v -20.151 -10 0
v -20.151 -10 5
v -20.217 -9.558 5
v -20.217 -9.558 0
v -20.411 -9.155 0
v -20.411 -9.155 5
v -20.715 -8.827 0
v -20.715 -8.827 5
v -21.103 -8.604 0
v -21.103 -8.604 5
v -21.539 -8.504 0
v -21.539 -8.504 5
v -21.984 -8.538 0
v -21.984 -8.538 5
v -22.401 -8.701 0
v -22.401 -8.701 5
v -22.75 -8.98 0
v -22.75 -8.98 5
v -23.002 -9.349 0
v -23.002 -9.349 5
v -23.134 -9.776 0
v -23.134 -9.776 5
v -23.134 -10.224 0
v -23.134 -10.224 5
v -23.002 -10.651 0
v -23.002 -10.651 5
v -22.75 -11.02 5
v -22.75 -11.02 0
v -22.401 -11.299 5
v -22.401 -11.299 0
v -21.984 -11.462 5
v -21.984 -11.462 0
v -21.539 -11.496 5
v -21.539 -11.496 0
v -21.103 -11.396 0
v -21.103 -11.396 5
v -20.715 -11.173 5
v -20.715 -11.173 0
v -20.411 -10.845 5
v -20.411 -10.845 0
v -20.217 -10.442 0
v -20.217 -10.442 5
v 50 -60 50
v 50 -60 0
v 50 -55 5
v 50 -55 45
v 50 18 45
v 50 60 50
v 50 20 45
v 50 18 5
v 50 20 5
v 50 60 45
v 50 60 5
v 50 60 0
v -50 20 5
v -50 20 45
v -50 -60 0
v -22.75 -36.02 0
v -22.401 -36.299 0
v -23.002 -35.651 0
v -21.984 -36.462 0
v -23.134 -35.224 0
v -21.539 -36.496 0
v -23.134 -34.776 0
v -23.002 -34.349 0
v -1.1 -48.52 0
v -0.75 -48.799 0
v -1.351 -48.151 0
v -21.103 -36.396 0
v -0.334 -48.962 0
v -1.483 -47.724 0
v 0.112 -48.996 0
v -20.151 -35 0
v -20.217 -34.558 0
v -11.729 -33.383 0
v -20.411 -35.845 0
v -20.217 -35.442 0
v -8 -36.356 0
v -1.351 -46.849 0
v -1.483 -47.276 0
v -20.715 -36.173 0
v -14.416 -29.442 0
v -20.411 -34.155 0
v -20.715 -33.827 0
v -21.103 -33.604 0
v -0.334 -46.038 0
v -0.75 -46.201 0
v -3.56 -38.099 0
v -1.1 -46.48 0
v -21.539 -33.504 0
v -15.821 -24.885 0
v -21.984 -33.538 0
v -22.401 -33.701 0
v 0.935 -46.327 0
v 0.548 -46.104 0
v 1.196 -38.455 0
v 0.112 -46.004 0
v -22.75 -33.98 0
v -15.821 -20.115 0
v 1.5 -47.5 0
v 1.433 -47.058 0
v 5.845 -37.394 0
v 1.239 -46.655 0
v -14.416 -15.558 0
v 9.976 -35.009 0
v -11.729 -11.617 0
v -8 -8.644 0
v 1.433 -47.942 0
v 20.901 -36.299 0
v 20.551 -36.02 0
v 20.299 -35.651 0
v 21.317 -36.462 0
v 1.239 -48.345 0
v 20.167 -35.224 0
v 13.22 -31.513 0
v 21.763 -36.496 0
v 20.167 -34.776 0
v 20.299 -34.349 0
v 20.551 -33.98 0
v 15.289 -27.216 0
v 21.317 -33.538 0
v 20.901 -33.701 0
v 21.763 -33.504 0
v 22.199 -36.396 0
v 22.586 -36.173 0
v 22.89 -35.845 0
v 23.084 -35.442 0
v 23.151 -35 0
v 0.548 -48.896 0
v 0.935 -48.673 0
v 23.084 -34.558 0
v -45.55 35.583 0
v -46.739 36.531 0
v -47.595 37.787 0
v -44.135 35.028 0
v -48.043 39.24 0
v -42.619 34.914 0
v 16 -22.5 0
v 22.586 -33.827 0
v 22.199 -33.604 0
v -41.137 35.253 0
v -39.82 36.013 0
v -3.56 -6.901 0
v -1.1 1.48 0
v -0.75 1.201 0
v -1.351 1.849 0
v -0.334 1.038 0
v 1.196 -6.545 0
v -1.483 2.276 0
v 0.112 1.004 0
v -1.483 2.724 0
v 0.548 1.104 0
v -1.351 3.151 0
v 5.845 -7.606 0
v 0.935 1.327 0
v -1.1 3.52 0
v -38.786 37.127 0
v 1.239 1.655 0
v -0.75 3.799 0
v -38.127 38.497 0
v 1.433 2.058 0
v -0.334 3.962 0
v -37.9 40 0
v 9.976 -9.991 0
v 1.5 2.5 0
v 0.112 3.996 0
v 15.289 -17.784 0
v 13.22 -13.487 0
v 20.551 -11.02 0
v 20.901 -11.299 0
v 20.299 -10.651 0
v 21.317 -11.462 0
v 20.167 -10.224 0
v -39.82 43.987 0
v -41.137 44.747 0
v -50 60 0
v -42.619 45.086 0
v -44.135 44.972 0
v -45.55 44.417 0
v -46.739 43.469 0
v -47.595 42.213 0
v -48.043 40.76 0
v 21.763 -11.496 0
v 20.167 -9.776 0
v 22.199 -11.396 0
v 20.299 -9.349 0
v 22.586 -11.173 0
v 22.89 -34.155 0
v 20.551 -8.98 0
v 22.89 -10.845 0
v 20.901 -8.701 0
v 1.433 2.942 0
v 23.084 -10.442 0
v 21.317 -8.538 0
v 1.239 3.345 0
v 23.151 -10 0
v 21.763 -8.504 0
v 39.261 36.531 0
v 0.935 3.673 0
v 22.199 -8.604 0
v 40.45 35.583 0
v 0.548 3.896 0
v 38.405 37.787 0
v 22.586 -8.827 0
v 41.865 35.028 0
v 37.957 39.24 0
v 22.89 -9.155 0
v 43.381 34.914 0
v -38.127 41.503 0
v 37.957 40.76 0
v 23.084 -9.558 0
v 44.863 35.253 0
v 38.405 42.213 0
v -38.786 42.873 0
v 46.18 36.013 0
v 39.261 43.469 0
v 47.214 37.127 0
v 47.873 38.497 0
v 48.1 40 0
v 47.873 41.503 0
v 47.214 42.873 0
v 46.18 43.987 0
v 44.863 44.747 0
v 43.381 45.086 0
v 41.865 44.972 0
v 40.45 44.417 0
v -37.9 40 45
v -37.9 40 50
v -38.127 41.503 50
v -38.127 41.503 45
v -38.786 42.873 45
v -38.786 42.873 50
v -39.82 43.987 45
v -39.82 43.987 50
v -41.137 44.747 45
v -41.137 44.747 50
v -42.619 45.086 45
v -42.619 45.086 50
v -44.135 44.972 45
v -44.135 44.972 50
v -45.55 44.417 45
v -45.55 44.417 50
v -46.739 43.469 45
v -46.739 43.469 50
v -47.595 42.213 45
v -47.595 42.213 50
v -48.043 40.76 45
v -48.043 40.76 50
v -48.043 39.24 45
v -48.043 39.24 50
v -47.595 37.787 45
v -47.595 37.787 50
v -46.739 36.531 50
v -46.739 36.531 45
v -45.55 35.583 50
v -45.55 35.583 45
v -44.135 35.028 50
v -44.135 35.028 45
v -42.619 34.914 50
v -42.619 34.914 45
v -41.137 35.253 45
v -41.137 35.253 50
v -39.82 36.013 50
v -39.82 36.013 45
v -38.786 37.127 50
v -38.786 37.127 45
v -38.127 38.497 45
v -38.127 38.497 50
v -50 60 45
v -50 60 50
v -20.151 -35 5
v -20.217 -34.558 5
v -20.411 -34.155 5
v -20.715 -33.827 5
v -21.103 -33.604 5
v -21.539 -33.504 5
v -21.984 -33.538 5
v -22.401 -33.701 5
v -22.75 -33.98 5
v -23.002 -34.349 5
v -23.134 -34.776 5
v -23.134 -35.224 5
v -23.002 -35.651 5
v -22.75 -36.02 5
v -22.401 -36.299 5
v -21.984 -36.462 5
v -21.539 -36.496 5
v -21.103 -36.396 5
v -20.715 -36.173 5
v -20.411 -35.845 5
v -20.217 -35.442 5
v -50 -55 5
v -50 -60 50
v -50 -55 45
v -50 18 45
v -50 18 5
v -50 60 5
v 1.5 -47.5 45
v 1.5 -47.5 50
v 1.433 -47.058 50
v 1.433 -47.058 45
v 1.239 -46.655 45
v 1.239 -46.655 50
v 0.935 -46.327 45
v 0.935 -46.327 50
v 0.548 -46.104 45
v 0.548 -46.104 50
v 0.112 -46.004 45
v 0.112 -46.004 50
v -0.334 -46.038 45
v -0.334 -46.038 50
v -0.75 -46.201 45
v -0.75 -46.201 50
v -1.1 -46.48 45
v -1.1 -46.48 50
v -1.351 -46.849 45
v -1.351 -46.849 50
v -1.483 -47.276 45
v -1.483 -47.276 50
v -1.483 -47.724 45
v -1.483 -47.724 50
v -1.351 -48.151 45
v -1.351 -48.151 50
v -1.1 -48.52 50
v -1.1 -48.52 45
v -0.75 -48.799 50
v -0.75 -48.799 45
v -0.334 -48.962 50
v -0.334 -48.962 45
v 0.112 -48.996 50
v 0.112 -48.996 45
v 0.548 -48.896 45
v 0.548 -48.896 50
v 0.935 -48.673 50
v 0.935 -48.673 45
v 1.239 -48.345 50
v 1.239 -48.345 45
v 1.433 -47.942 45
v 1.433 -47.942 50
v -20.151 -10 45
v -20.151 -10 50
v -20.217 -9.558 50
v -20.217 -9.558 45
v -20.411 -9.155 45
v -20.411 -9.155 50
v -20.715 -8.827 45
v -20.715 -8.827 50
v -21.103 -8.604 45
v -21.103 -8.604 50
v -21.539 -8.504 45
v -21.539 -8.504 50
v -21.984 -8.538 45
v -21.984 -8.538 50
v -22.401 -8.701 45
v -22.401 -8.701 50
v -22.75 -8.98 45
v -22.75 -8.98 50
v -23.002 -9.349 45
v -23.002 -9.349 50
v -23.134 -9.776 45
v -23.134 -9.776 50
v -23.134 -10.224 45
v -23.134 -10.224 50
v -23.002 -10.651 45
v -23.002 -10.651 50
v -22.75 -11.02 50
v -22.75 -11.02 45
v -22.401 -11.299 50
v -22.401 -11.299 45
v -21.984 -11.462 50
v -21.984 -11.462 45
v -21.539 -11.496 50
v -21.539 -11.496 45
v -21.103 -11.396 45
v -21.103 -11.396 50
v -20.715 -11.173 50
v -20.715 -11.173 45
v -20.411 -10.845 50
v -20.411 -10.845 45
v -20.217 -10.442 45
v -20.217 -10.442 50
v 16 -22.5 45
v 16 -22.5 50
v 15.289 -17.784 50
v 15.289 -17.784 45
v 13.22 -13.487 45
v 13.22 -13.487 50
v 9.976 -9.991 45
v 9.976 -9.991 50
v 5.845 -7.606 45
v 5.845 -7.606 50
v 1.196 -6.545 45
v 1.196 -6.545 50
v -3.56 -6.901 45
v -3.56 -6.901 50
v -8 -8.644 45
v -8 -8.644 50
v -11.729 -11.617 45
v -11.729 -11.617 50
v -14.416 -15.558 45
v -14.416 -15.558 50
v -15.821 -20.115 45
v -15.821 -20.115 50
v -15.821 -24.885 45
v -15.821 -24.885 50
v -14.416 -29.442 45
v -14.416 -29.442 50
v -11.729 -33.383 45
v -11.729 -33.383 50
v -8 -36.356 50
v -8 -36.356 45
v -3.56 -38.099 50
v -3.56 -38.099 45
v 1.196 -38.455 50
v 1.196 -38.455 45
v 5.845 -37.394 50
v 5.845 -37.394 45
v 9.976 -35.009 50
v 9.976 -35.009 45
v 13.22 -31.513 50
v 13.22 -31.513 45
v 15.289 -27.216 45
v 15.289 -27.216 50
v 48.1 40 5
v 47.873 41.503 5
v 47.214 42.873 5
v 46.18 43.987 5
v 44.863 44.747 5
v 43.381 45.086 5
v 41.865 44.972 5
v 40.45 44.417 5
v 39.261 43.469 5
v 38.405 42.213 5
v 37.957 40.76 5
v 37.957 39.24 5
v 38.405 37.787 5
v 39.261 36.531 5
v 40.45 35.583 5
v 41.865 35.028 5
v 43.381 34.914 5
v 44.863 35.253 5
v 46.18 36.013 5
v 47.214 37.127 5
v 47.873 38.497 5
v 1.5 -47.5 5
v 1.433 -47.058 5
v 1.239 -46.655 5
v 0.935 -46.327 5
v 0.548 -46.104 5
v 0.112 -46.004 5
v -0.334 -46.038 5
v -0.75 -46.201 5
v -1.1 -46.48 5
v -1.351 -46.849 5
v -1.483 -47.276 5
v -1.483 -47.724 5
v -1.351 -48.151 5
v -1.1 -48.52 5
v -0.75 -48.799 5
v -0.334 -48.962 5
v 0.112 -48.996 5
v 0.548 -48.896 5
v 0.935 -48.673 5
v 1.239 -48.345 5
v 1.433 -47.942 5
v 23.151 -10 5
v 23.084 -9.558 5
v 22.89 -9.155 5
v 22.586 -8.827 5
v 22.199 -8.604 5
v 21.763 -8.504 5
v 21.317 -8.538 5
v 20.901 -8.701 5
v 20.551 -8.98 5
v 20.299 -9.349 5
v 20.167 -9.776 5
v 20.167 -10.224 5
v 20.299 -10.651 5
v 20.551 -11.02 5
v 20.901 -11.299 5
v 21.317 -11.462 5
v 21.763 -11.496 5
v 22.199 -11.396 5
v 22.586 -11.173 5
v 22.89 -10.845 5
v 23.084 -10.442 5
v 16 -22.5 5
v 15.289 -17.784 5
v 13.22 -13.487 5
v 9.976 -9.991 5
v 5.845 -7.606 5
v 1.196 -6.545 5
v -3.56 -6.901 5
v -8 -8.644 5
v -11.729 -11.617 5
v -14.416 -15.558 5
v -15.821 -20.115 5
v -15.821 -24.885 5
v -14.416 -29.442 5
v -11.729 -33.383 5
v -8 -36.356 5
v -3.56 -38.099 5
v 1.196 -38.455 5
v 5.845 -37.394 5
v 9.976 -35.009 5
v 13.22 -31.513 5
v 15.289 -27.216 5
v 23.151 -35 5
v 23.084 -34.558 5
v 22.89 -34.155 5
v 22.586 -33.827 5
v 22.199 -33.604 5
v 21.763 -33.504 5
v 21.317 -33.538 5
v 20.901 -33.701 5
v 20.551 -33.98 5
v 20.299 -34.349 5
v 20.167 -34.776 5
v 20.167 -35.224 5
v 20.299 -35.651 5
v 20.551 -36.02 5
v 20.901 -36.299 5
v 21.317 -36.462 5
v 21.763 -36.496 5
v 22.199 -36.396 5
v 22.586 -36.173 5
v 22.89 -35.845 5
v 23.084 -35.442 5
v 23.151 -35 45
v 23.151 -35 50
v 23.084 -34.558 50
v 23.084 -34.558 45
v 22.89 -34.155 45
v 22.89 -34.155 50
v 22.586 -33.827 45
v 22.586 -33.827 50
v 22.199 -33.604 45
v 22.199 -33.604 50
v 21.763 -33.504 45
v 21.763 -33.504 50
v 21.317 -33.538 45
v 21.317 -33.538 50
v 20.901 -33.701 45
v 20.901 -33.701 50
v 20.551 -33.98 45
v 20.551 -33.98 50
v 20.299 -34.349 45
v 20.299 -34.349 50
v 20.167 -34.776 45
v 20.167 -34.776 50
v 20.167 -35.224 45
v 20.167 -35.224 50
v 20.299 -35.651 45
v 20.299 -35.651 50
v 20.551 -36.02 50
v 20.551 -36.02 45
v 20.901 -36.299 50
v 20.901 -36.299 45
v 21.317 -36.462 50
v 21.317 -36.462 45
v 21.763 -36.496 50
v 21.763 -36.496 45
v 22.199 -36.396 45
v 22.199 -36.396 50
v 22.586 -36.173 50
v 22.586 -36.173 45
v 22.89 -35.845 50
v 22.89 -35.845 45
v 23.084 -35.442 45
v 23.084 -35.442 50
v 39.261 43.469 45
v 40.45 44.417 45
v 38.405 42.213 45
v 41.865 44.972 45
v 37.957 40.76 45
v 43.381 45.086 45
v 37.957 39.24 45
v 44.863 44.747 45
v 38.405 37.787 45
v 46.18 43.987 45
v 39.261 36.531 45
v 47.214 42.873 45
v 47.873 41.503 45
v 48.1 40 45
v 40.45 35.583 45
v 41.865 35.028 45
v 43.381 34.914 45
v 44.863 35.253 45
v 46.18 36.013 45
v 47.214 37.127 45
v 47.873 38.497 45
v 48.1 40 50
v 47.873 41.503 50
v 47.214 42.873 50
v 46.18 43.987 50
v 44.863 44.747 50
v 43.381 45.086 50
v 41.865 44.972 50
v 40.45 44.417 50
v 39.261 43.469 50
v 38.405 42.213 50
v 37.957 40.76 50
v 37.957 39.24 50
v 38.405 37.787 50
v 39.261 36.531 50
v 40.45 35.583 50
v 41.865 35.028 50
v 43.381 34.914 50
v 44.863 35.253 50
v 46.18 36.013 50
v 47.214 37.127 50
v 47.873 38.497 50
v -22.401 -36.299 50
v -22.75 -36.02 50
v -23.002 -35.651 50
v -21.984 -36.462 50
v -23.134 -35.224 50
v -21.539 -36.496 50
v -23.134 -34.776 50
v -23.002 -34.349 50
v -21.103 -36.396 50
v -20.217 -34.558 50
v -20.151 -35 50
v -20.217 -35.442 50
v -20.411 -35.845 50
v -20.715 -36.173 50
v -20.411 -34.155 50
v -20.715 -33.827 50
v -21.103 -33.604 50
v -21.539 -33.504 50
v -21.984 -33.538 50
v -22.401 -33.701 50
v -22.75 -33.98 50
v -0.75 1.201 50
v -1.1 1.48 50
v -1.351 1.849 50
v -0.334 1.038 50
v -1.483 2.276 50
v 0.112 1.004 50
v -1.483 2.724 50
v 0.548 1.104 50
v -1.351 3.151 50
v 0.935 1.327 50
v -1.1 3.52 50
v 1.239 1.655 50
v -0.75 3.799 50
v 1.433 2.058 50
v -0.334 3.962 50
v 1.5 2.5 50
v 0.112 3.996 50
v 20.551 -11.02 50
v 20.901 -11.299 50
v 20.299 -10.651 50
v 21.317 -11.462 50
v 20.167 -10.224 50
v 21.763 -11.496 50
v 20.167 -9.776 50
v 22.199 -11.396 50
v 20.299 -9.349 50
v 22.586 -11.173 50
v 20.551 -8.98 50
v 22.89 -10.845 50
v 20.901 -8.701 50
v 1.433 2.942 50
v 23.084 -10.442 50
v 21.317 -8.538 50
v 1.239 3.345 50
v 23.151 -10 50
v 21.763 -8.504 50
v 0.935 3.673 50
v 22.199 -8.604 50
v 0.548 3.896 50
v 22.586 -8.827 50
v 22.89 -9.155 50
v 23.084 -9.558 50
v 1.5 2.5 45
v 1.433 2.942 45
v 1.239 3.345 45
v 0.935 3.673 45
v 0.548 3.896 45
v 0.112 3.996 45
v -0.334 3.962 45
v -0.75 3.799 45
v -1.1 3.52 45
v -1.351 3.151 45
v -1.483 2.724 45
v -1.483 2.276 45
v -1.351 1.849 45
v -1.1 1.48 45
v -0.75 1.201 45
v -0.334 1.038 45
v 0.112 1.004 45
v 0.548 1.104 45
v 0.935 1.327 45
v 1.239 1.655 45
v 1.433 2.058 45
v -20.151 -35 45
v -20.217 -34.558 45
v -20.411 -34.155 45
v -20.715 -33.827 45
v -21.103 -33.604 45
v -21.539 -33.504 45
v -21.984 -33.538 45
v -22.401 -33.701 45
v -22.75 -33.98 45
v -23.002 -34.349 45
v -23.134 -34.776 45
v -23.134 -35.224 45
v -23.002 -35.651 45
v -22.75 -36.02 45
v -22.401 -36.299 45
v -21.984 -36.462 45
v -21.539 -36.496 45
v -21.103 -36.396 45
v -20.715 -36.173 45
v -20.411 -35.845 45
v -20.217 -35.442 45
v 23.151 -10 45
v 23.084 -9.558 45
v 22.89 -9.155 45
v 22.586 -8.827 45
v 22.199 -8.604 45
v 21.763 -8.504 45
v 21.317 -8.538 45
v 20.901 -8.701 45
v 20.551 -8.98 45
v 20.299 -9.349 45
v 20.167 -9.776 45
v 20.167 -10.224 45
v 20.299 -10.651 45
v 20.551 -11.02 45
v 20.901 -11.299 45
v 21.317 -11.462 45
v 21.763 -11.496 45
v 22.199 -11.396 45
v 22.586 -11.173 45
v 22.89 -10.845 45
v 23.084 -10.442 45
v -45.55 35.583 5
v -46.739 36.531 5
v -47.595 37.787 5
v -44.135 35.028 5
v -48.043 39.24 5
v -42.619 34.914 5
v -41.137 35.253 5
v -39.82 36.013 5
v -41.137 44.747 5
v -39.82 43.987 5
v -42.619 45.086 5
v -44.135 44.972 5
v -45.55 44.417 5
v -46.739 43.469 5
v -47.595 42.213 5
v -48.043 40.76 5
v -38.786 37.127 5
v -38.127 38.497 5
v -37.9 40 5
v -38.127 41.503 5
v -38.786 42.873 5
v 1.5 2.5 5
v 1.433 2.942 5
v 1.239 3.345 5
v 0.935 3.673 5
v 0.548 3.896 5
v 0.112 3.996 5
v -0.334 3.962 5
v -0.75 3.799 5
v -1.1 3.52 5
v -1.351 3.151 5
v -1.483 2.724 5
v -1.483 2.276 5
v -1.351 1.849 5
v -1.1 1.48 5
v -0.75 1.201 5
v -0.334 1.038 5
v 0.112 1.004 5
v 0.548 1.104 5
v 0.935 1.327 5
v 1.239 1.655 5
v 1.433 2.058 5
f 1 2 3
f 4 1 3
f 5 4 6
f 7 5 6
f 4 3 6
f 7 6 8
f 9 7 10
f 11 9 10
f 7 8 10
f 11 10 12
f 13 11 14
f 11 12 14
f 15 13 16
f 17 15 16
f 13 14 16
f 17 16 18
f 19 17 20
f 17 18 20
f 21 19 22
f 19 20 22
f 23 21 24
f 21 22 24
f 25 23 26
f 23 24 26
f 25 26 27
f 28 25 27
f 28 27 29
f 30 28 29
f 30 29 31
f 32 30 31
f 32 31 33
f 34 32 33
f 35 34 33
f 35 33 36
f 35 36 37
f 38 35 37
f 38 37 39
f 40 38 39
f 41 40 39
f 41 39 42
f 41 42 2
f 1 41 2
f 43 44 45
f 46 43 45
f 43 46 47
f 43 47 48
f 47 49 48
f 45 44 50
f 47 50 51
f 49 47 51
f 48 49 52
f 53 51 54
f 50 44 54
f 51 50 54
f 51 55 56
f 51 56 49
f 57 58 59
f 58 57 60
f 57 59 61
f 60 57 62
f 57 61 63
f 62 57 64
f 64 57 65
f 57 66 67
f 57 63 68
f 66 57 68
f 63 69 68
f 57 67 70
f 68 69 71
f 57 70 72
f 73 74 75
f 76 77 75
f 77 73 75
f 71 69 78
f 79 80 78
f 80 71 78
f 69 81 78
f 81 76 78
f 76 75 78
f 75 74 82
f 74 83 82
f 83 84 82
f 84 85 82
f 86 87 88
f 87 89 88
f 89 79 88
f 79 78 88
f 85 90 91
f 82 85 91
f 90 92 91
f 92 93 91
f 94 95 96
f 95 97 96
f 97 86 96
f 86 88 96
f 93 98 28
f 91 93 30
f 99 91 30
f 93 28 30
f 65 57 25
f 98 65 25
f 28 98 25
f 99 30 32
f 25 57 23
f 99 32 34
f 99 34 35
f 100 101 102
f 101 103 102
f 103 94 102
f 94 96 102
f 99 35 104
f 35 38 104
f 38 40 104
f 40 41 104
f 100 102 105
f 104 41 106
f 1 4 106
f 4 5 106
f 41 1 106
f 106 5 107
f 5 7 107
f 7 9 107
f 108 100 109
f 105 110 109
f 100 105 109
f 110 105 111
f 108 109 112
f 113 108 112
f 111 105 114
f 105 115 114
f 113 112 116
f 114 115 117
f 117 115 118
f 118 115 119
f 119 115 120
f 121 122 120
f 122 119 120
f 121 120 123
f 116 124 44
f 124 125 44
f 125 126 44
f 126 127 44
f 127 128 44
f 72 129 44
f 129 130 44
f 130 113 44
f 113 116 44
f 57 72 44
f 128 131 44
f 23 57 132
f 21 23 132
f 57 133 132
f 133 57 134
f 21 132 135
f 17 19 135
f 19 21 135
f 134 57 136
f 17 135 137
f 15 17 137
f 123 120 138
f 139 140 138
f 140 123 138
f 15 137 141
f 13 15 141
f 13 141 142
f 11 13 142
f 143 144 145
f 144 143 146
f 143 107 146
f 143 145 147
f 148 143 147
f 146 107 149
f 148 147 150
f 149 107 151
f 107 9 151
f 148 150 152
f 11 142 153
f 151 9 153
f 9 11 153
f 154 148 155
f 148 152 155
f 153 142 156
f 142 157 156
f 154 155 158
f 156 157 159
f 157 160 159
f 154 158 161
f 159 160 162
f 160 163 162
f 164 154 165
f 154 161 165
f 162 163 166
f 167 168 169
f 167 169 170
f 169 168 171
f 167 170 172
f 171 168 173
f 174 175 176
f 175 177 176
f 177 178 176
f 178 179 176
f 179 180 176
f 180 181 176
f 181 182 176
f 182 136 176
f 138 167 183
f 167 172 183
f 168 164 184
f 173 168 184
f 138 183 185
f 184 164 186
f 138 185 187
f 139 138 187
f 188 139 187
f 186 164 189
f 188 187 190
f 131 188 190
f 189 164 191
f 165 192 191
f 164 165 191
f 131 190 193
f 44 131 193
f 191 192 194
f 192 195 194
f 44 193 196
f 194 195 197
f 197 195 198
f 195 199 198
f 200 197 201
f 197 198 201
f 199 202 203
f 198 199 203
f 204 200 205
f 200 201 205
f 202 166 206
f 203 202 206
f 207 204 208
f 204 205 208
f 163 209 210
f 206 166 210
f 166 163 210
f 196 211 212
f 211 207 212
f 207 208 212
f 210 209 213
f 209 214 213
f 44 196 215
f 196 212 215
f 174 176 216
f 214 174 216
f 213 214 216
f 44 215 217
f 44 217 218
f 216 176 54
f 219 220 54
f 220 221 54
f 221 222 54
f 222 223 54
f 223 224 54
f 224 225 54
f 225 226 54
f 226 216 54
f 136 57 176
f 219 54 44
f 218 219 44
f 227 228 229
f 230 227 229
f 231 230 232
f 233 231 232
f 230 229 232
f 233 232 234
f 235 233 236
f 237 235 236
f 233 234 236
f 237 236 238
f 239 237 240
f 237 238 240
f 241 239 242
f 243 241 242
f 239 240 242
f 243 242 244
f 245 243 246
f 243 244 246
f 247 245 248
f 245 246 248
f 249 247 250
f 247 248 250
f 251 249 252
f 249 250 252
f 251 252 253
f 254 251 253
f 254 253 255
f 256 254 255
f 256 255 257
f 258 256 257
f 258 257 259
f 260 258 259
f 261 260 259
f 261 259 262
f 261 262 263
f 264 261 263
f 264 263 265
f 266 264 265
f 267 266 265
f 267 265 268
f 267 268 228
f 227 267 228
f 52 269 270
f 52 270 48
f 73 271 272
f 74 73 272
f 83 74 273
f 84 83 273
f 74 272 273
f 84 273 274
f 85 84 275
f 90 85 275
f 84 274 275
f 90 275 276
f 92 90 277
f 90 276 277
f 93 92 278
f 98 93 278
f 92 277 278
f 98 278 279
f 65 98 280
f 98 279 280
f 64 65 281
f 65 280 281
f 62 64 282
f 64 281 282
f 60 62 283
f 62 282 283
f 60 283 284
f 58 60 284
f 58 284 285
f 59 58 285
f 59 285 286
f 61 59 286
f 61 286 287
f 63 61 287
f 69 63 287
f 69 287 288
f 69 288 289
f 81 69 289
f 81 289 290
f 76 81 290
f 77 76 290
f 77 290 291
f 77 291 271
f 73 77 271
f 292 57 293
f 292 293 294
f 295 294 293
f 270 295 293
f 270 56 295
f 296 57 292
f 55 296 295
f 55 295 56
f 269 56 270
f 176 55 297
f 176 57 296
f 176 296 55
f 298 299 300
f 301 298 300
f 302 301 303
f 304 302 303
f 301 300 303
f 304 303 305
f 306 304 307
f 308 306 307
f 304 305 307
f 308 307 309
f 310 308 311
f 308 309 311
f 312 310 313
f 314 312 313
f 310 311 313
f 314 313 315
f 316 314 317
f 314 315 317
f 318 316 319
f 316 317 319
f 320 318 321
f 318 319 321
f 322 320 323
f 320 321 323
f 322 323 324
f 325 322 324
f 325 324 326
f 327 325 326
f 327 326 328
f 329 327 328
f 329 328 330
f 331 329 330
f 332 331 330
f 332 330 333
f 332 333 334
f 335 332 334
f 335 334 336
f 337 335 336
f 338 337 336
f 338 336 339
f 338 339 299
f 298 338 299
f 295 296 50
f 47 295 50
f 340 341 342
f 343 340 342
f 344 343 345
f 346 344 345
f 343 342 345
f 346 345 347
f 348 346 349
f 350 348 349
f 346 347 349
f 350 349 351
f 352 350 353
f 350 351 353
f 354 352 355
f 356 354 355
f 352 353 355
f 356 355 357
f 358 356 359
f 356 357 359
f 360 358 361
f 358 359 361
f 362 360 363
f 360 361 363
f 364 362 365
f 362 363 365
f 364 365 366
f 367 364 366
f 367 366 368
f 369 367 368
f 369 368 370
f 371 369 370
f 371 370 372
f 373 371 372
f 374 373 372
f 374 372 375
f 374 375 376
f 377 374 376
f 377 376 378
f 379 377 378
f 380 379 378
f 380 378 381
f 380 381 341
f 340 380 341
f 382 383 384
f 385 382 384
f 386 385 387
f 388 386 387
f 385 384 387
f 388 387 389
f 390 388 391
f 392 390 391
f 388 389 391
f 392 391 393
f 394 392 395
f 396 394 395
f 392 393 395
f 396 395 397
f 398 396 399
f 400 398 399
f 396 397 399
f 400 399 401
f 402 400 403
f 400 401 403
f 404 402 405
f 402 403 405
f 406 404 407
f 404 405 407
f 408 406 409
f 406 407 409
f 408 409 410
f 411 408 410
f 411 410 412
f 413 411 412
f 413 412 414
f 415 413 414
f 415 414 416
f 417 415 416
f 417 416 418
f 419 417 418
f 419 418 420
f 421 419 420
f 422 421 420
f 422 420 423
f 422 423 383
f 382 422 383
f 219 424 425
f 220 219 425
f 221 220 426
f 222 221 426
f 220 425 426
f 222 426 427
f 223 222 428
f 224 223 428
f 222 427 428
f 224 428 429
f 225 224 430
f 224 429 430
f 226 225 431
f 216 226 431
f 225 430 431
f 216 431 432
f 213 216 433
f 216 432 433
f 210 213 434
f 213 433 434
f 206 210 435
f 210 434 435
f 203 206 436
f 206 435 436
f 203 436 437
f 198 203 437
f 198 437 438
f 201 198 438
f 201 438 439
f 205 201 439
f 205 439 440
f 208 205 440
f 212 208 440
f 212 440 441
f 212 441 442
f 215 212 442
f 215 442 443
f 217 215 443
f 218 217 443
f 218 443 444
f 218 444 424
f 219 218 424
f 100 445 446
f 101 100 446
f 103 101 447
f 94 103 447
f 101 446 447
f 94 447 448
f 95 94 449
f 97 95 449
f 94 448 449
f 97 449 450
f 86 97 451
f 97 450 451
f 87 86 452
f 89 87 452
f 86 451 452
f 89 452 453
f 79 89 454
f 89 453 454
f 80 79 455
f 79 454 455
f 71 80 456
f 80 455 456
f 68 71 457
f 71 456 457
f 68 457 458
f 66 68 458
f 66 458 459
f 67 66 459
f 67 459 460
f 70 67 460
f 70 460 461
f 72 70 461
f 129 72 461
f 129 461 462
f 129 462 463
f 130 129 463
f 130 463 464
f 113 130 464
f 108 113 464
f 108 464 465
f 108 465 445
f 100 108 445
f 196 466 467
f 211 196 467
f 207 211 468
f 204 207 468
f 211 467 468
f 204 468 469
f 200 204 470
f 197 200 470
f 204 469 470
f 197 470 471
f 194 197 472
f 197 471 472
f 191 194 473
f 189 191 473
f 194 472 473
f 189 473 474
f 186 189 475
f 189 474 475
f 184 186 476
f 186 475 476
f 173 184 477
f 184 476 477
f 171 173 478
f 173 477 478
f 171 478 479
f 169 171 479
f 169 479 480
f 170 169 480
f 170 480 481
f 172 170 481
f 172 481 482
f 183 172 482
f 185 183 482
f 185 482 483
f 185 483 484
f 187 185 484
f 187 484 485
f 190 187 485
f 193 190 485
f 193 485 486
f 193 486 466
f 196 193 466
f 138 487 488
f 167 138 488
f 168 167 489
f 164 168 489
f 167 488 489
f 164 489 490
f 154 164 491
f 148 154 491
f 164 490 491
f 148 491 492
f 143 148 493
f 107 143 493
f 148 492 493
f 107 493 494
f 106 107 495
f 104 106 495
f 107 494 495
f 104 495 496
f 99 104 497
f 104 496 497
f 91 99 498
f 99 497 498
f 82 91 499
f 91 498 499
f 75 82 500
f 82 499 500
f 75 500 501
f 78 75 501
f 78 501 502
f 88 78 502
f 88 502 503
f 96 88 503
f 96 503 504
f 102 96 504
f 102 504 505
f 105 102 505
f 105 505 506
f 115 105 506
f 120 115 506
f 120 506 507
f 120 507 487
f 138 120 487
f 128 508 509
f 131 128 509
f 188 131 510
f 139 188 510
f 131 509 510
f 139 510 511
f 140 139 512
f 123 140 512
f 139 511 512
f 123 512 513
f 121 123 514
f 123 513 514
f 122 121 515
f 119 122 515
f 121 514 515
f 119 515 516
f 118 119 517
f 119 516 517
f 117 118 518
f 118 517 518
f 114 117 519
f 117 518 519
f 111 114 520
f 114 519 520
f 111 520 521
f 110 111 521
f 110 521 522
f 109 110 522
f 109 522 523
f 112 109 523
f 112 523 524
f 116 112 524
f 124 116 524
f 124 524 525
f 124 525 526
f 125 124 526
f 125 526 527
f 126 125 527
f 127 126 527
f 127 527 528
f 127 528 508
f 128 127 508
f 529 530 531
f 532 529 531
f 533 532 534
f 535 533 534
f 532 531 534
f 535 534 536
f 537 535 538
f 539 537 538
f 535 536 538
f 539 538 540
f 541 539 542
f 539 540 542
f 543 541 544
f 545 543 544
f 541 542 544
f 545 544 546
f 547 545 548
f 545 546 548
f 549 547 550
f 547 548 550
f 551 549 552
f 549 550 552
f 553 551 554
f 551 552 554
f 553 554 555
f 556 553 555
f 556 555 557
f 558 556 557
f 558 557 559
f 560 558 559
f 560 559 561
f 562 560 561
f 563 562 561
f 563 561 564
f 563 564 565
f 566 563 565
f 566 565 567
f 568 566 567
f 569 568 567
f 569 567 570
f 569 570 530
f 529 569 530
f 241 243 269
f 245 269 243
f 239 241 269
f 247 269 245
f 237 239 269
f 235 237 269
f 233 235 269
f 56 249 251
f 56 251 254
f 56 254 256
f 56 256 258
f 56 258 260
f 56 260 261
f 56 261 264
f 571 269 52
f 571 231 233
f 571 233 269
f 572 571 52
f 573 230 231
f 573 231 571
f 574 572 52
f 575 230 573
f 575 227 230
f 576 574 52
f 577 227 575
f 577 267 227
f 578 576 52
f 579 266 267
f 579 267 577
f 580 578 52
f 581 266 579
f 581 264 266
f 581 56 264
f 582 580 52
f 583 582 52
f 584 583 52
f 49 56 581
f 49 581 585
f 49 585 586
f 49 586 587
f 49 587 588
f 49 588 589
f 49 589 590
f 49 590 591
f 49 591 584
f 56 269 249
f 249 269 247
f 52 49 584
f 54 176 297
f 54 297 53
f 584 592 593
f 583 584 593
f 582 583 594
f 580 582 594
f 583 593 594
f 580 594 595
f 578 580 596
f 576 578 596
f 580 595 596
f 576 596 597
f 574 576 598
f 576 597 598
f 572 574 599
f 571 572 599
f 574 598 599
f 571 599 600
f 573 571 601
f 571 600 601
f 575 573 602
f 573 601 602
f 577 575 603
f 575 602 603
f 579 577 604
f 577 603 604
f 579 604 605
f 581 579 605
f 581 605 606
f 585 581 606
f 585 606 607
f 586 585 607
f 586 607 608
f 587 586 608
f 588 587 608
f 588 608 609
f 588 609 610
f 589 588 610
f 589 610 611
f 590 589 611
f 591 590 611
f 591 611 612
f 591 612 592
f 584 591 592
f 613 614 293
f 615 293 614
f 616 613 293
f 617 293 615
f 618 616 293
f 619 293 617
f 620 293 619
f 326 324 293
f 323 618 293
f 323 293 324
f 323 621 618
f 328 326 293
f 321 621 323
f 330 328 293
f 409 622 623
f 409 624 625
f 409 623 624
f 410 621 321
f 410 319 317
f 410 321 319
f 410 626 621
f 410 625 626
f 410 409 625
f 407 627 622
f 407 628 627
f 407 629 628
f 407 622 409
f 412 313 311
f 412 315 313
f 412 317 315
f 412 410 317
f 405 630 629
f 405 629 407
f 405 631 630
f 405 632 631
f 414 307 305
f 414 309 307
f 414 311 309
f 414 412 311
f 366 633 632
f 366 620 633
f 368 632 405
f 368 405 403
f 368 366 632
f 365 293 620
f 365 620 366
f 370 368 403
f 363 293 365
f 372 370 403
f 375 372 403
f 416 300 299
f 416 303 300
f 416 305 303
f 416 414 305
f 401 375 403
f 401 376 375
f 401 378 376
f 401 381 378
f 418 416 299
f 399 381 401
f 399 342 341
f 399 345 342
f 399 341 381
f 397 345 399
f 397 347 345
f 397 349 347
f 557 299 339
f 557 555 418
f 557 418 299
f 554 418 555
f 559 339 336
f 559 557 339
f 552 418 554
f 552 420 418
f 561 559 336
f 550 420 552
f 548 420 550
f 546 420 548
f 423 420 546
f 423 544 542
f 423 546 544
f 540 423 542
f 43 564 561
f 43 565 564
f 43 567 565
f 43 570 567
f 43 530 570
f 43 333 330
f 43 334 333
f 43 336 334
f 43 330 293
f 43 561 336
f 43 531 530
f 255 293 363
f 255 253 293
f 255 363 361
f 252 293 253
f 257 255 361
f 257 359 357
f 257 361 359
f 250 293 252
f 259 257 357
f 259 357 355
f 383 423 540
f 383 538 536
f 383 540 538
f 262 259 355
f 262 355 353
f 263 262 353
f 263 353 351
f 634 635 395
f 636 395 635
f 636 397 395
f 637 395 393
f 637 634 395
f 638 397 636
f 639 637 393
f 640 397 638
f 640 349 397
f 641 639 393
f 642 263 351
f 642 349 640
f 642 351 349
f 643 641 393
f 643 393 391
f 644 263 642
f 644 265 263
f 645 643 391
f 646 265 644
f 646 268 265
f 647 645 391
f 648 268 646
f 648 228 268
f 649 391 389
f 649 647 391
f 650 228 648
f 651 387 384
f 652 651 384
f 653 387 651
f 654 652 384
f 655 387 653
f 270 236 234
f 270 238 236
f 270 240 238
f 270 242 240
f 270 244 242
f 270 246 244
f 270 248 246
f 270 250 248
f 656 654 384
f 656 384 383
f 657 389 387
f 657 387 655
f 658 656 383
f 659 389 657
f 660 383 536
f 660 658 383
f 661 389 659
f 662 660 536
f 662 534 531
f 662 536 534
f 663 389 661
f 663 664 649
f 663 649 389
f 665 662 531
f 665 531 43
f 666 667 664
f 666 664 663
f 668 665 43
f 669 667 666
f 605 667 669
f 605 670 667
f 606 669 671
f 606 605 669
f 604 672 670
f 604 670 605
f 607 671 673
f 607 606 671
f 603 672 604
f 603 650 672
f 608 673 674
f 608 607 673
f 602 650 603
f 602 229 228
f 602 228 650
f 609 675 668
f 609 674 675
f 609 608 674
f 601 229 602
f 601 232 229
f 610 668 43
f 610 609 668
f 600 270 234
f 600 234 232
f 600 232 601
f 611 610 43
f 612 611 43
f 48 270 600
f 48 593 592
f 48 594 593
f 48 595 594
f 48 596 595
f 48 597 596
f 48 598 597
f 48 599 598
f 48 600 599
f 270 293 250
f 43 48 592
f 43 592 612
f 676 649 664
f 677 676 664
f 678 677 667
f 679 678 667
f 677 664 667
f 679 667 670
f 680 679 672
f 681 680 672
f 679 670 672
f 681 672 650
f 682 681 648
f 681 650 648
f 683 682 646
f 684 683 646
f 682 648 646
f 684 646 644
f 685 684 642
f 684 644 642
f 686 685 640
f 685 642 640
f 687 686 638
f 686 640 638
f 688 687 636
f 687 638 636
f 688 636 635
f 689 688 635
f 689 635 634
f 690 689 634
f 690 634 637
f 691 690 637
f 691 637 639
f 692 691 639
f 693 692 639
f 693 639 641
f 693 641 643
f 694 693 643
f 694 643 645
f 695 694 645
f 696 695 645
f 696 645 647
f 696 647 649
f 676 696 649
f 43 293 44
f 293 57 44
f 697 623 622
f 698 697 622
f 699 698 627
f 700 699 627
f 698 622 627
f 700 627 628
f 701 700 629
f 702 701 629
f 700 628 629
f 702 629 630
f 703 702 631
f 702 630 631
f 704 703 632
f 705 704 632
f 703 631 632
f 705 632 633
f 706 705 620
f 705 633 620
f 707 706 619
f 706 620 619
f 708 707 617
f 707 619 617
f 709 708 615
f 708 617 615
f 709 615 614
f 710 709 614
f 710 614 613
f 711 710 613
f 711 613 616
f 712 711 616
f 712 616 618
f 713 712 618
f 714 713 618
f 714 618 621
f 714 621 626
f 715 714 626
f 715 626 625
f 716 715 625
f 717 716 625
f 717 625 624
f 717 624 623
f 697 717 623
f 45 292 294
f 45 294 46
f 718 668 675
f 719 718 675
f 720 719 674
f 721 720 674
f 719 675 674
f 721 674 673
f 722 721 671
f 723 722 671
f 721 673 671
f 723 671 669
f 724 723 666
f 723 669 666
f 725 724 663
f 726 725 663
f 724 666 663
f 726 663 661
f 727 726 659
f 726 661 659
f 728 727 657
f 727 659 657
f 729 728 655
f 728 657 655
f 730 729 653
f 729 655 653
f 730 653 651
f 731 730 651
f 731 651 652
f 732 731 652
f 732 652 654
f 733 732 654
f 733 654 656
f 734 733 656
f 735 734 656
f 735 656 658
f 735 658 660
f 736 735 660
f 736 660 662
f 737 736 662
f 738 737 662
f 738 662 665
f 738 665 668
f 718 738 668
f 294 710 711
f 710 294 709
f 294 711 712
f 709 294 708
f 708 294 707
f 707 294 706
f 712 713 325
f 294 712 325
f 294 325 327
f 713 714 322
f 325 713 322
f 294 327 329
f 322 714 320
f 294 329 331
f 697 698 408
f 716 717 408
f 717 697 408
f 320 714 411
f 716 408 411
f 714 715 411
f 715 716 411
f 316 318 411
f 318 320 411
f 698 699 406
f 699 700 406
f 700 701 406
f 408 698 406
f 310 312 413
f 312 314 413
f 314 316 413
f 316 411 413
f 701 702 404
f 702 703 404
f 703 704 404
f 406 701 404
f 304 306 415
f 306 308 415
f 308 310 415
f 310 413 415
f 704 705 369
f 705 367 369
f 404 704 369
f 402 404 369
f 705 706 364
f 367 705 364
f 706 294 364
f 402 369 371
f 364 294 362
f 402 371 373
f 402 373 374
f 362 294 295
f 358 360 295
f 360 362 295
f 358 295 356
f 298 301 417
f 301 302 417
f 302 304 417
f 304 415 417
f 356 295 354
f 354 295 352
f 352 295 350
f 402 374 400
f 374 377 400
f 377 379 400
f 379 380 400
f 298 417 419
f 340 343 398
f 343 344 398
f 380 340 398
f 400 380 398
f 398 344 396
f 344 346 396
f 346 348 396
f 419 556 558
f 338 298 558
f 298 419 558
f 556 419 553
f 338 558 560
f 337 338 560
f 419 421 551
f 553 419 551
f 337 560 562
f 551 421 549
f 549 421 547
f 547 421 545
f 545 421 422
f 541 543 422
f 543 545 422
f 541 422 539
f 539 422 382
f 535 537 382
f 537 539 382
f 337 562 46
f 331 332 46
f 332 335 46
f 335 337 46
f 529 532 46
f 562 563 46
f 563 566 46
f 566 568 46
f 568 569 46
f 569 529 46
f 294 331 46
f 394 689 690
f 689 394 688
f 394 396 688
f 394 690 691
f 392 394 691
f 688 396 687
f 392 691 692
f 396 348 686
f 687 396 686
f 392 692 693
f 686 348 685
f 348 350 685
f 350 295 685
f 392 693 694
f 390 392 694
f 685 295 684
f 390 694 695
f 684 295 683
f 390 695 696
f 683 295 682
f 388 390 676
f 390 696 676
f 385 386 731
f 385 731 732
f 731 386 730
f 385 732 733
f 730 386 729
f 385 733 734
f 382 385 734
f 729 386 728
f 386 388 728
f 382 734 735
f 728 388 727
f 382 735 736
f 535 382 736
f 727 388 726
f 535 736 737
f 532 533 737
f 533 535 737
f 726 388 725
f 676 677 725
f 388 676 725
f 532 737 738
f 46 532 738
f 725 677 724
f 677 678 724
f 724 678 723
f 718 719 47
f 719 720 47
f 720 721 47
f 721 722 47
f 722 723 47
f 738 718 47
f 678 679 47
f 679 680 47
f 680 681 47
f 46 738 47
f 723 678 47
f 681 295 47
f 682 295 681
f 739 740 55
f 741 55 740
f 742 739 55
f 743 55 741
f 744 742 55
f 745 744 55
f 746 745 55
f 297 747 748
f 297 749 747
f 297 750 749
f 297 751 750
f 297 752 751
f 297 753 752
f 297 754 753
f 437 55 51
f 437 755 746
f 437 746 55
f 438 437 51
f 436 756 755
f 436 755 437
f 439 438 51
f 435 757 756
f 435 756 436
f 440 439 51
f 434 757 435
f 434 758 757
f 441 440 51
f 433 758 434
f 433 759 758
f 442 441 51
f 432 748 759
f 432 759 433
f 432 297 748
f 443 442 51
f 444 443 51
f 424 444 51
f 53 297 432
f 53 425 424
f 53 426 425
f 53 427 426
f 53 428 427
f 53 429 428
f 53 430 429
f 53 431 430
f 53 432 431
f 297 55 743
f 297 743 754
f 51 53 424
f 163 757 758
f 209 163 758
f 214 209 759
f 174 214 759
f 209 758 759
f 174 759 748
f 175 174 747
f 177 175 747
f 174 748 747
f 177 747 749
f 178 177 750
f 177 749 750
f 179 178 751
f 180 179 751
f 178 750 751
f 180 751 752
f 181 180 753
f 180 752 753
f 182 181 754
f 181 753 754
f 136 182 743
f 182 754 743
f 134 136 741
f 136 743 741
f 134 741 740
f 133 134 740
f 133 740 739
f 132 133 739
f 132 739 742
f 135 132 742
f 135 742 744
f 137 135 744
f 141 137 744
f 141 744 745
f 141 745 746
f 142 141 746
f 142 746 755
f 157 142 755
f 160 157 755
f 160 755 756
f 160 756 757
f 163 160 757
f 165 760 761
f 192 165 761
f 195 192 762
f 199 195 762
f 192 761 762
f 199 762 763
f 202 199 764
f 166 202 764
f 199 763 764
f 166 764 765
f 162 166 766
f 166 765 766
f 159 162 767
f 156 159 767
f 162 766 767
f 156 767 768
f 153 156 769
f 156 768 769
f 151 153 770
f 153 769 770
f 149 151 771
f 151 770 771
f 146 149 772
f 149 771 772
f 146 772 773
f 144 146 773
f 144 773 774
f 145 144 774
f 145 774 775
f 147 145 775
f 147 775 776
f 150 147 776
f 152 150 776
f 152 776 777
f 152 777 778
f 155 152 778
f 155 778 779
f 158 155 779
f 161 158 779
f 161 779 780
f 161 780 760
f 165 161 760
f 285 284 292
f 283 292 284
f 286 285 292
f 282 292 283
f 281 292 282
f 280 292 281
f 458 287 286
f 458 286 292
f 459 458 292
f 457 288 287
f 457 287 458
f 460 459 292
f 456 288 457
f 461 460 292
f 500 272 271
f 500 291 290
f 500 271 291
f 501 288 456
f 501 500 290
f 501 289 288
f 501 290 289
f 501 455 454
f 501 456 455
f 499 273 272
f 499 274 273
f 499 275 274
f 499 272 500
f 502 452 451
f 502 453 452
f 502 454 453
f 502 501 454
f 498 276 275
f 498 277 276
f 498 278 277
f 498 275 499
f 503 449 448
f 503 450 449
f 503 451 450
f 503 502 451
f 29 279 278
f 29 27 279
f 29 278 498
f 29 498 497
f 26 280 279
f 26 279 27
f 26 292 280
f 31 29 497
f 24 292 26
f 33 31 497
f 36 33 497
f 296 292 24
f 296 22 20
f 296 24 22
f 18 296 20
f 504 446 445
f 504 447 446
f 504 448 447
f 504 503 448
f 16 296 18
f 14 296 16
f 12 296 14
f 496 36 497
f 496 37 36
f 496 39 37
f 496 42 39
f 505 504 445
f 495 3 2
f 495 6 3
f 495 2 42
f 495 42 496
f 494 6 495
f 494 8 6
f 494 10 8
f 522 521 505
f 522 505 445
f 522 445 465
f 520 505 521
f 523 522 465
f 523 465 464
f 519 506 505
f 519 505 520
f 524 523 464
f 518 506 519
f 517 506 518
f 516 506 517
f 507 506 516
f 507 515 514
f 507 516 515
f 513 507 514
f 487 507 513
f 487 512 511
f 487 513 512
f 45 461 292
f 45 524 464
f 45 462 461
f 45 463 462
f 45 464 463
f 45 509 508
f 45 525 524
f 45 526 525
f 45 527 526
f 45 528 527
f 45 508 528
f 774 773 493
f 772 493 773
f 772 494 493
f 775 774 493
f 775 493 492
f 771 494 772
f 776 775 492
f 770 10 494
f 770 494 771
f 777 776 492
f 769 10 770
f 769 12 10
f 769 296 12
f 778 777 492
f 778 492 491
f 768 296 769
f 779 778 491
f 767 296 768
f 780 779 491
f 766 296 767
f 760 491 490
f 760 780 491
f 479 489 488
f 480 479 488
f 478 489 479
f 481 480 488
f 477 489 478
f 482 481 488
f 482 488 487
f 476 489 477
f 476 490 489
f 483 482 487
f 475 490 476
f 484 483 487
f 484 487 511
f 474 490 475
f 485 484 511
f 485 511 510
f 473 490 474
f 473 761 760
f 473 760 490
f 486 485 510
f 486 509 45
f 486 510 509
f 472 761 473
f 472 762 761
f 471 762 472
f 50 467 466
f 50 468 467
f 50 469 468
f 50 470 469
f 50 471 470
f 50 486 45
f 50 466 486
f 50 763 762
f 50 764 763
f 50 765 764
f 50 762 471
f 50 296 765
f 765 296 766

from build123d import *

# Parameters (mm, degrees)
SKETCH1_W                = 100
SKETCH1_H                = 120
BOSS_EXTRUDE1_DEPTH      = 5
SKETCH2_W                = 100
SKETCH2_H                = 2
BOSS_EXTRUDE2_DEPTH      = 45
BOSS_EXTRUDE3_DEPTH      = 40
BOSS_EXTRUDE3_DEPTH_BACK = 60
SKETCH3_W                = 100
SKETCH3_H                = 5
SKETCH6_W                = 100
SKETCH6_H                = 5
BOSS_EXTRUDE4_DEPTH      = 15
SKETCH7_W                = 100
SKETCH7_H                = 5
BOSS_EXTRUDE5_DEPTH      = 45
SKETCH8_R                = 16
SKETCH8_R_2              = 1.5
CUT_EXTRUDE1_DEPTH       = 93.736184955
SKETCH10_R               = 5.1
CUT_EXTRUDE2_DEPTH       = 93.736184955


with BuildPart() as part:
    # Sketch1 → Boss-Extrude1 (new body)
    with BuildSketch(Plane.XY):
        Rectangle(SKETCH1_W, SKETCH1_H)
    extrude(amount=BOSS_EXTRUDE1_DEPTH)

    # Sketch2 → Boss-Extrude2 (add)
    with BuildSketch(Plane.XY.offset(5)):
        with Locations((0, 19)):
            Rectangle(SKETCH2_W, SKETCH2_H)
    extrude(amount=BOSS_EXTRUDE2_DEPTH)

    # Sketch3 → Boss-Extrude3 (add, two sides: drawn at the far end of the back side and taken through both)
    with BuildSketch(Plane(origin=(0, 20, 0), x_dir=(1, 0, 0), z_dir=(0, 1, 0)).offset(-BOSS_EXTRUDE3_DEPTH_BACK)):
        with Locations((0, -47.5)):
            Rectangle(SKETCH3_W, SKETCH3_H)
    extrude(amount=BOSS_EXTRUDE3_DEPTH + BOSS_EXTRUDE3_DEPTH_BACK)

    # Sketch6 → Boss-Extrude4 (add)
    with BuildSketch(Plane.XZ.offset(40)):
        with Locations((0, 47.5)):
            Rectangle(SKETCH6_W, SKETCH6_H)
        with Locations((0, 2.5)):
            Rectangle(SKETCH6_W, SKETCH6_H)
    extrude(amount=BOSS_EXTRUDE4_DEPTH)

    # Sketch7 → Boss-Extrude5 (add)
    with BuildSketch(Plane.XY.offset(5)):
        with Locations((0, -57.5)):
            Rectangle(SKETCH7_W, SKETCH7_H)
    extrude(amount=BOSS_EXTRUDE5_DEPTH)

    # Sketch8 → Cut-Extrude1 (cut, through all)
    with BuildSketch(Plane.XY.offset(50)):
        with Locations((0, -22.5)):
            Circle(SKETCH8_R)
        with Locations((0, 2.5)):
            Circle(SKETCH8_R_2)
        with Locations((21.650635095, -10)):
            Circle(SKETCH8_R_2)
        with Locations((21.650635095, -35)):
            Circle(SKETCH8_R_2)
        with Locations((0, -47.5)):
            Circle(SKETCH8_R_2)
        with Locations((-21.650635095, -35)):
            Circle(SKETCH8_R_2)
        with Locations((-21.650635095, -10)):
            Circle(SKETCH8_R_2)
    extrude(amount=-CUT_EXTRUDE1_DEPTH, mode=Mode.SUBTRACT)

    # Sketch10 → Cut-Extrude2 (cut, through all)
    with BuildSketch(Plane.XY.offset(50)):
        with Locations((-43, 40)):
            Circle(SKETCH10_R)
        with Locations((43, 40)):
            Circle(SKETCH10_R)
    extrude(amount=-CUT_EXTRUDE2_DEPTH, mode=Mode.SUBTRACT)


solid = part.part
